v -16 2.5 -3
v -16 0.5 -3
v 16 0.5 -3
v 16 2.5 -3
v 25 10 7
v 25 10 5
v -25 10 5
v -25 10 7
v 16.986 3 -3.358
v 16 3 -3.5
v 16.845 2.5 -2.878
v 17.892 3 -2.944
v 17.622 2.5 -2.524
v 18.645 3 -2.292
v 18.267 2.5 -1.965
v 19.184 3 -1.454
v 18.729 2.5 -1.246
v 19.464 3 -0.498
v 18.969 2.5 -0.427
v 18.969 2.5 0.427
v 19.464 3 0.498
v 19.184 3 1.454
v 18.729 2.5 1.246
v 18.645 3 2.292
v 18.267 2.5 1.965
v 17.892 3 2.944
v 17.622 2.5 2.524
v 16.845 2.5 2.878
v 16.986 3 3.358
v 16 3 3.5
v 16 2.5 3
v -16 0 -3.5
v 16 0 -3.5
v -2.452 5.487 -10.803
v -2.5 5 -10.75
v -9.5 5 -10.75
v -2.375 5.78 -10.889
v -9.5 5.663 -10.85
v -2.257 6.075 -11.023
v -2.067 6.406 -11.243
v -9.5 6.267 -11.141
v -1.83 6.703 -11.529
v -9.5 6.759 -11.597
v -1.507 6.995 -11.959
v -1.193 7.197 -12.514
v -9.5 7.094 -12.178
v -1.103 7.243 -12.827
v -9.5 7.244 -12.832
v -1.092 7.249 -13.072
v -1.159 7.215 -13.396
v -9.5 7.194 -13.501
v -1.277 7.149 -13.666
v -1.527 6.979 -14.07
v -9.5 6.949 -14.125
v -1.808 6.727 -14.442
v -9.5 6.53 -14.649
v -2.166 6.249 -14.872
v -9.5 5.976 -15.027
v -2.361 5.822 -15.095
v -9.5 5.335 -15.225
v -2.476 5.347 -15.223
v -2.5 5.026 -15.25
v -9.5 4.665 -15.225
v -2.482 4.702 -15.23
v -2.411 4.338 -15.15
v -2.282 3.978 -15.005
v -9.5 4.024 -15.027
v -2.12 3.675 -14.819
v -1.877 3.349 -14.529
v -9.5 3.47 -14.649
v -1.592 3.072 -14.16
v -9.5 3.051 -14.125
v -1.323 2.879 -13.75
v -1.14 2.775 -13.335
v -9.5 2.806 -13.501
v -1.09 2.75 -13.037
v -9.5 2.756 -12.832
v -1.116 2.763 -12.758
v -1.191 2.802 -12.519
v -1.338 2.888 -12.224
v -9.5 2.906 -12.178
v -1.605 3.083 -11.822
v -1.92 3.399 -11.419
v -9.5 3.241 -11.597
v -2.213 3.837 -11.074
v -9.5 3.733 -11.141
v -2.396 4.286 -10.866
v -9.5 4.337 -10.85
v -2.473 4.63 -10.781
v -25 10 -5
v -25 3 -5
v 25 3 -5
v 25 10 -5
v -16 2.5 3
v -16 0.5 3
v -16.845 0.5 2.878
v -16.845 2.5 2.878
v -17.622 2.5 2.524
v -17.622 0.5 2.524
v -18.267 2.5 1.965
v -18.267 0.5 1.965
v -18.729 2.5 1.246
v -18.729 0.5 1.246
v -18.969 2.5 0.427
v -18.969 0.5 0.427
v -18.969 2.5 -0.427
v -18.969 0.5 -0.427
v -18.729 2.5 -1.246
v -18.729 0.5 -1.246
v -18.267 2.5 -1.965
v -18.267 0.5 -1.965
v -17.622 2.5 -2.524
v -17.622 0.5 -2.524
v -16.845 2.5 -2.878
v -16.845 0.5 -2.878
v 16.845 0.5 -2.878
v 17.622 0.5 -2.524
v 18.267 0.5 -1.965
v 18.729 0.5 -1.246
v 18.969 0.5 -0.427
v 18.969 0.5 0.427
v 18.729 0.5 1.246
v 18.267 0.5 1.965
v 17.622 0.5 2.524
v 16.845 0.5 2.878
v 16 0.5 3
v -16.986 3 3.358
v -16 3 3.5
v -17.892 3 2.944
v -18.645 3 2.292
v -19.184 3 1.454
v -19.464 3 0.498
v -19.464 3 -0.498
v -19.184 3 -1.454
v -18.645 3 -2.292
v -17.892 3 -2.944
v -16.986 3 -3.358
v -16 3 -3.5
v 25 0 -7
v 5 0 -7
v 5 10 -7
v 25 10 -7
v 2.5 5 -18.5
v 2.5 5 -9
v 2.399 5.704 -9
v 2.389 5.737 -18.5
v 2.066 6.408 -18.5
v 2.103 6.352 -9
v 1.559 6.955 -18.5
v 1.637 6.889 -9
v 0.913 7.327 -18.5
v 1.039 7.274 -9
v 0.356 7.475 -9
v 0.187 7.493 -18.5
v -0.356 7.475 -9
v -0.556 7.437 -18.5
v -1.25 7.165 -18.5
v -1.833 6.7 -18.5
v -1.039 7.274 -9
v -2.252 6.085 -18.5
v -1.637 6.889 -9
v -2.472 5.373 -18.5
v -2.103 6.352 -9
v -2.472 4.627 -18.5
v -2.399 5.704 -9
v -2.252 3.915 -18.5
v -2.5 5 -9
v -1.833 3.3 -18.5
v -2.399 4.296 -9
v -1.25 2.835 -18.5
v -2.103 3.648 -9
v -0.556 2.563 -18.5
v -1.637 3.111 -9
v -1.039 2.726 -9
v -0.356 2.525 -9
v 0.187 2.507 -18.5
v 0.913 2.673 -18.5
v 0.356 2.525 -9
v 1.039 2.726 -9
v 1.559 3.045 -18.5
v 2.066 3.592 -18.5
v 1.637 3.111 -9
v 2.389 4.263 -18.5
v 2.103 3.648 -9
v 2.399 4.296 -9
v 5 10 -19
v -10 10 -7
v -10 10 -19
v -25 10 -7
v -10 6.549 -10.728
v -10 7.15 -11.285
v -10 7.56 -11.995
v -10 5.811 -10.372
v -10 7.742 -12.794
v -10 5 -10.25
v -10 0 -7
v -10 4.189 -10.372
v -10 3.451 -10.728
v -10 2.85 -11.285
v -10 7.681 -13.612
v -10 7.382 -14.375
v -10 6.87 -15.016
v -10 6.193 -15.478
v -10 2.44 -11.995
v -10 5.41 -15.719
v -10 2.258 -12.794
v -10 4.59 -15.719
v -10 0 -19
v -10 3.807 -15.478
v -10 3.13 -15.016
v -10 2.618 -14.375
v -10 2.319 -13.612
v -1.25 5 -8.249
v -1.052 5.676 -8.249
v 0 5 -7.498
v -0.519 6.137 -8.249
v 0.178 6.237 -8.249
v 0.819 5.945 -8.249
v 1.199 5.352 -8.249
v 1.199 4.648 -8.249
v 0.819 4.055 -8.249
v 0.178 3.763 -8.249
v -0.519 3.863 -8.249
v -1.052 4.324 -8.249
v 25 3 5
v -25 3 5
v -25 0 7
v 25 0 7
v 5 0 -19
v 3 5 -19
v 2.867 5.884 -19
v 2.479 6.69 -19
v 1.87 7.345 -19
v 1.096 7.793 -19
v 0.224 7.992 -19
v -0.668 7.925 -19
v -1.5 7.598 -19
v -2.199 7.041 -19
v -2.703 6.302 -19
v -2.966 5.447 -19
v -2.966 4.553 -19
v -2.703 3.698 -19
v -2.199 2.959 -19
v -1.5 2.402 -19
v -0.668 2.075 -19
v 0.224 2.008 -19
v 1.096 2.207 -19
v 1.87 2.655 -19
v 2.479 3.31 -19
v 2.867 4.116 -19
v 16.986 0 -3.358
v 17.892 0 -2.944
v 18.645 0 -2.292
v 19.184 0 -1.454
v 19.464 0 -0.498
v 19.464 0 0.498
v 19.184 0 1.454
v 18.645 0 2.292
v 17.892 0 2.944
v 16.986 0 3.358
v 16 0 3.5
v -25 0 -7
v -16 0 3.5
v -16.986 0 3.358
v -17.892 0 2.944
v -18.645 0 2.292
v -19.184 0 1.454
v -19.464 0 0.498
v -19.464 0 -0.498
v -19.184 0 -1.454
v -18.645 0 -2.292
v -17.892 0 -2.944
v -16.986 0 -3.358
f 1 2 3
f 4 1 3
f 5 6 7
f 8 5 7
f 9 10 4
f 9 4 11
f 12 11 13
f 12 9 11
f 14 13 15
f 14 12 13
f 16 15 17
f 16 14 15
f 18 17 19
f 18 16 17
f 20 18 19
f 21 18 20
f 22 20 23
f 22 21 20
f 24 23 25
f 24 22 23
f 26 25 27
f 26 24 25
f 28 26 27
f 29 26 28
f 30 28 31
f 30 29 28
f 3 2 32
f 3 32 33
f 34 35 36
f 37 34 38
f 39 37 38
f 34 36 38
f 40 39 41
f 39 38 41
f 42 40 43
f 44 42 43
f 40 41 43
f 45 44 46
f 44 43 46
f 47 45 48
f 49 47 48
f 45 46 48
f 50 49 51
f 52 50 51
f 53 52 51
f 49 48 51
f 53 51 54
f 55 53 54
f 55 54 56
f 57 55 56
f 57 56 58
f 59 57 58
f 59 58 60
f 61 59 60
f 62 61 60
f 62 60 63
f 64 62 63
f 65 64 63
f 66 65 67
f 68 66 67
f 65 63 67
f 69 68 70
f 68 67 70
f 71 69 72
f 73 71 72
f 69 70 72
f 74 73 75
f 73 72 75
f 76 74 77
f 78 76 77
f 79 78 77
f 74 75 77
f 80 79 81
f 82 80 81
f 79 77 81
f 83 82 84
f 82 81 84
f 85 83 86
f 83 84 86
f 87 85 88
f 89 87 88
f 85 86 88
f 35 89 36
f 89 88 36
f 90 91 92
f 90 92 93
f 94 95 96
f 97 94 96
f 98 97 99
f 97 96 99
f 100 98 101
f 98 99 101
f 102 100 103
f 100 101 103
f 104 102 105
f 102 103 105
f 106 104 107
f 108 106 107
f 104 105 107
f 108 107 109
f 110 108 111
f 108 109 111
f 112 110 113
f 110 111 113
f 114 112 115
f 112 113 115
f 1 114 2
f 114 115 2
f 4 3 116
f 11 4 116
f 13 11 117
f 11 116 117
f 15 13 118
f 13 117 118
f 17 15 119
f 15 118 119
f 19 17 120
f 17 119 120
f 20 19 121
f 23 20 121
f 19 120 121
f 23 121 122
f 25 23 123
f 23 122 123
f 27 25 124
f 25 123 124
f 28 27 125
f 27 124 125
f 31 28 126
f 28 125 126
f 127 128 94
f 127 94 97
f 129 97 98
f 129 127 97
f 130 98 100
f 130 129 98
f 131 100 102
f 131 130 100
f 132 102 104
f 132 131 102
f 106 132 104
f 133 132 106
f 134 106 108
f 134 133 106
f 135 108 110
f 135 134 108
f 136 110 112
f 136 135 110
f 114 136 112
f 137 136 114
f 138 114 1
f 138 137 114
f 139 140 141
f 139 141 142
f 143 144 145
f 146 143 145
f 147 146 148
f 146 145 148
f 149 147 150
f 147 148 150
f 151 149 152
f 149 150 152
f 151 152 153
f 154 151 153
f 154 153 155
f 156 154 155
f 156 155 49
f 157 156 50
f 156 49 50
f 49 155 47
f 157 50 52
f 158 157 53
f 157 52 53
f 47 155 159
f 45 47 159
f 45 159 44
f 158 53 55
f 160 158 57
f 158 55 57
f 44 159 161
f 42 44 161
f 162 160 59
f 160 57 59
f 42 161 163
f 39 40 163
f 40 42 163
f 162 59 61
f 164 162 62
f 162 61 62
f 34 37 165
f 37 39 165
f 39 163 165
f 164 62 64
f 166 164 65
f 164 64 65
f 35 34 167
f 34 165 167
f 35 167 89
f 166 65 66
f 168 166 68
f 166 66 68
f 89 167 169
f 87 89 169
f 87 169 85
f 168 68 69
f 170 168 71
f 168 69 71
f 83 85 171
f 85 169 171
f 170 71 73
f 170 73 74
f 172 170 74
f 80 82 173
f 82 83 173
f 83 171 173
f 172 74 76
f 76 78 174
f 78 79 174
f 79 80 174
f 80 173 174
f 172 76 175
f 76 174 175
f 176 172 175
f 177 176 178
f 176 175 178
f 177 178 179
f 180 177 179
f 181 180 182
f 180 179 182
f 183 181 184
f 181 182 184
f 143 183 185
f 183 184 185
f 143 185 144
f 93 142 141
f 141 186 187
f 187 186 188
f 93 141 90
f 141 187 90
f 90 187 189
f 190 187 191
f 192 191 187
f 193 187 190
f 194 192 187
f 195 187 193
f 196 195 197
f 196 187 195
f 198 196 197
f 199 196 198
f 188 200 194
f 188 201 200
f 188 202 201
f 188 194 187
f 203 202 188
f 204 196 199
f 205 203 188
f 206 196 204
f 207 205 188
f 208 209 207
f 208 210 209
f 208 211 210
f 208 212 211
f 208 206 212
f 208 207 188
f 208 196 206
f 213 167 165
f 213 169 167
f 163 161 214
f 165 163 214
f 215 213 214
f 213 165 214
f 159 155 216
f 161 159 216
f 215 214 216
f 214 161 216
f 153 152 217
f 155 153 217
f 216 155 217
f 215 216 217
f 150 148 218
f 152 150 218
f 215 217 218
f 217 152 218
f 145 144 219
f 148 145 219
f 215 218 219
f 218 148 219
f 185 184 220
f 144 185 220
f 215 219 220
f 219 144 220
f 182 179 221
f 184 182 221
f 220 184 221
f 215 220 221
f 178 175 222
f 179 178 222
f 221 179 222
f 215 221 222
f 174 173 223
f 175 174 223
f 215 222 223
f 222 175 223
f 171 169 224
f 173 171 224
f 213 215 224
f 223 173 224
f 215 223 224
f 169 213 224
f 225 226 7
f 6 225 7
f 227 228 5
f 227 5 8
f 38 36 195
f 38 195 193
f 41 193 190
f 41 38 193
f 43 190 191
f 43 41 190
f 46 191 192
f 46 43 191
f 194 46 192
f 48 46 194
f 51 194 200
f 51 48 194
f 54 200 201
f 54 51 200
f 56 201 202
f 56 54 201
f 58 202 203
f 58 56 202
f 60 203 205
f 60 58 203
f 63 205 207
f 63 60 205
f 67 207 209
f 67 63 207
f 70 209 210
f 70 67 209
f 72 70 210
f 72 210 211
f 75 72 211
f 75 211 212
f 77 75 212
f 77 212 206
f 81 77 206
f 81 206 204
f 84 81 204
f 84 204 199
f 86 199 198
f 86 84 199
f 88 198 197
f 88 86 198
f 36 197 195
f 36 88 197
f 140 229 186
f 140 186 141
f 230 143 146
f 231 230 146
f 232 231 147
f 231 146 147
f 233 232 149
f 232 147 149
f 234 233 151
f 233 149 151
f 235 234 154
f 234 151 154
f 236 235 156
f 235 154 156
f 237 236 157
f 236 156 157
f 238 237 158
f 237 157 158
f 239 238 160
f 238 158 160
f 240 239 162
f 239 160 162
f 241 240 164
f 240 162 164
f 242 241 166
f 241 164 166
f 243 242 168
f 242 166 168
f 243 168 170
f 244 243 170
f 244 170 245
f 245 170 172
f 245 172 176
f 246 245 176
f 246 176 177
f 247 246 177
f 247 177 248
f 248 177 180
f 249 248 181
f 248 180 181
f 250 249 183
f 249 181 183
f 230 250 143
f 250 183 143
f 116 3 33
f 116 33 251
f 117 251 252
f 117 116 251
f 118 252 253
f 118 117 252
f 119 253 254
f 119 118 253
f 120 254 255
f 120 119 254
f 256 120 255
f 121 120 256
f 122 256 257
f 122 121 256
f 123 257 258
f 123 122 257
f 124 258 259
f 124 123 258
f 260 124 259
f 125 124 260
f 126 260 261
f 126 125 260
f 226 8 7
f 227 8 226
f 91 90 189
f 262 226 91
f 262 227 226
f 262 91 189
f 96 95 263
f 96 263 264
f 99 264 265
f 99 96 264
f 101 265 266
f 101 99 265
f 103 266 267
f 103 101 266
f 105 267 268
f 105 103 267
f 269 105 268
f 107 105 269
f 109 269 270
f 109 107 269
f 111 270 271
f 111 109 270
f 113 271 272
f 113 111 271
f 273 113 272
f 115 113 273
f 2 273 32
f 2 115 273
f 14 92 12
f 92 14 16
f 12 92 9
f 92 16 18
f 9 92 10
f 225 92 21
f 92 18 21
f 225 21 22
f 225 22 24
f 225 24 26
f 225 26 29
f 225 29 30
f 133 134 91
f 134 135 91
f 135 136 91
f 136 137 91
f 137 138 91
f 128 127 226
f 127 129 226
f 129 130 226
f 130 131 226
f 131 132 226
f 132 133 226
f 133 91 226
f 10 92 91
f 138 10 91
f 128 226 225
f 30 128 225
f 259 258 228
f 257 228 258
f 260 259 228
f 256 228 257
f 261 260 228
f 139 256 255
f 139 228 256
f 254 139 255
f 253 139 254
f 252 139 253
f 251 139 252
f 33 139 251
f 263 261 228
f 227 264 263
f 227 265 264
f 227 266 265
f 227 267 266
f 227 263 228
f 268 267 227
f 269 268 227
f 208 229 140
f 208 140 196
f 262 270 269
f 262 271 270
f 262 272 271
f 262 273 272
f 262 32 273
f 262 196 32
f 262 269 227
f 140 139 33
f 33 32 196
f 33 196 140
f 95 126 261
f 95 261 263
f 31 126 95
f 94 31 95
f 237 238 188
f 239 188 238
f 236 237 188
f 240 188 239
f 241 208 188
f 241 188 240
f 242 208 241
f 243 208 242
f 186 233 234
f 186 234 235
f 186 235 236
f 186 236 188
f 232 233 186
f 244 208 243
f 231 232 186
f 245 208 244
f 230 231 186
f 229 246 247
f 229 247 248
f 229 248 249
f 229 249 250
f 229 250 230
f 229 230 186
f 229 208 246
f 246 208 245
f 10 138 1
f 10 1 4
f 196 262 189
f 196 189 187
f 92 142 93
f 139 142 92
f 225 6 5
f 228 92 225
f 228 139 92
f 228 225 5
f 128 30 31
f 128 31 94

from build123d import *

# Parameters (mm, degrees)
BOSS_EXTRUDE1_DEPTH              = 10
SKETCH2_W                        = 10
SKETCH2_H                        = 7
CUT_EXTRUDE2_DEPTH               = 71
CUT_EXTRUDE3_DEPTH               = 71
F_5_0_19685_DIAMETER_HOLE1_D     = 4.99999
F_5_0_19685_DIAMETER_HOLE1_DEPTH = 10
F_5_0_19685_DIAMETER_HOLE1_TIP   = 1.502148543
CUT_EXTRUDE4_REACH               = 43.061
CUT_EXTRUDE4_END_RADIUS          = 2.499995
SKETCH8_R                        = 2.25
CHAMFER1_SIZE                    = 0.5


with BuildPart() as part:
    # Sketch1 → Boss-Extrude1 (new body)
    with BuildSketch(Plane(origin=(0, 0, 0), x_dir=(1, 0, 0), z_dir=(0, 1, 0))):
        Polygon((-10, 7), (-10, 19), (5, 19), (5, 7), (25, 7), (25, -7), (-25, -7), (-25, 7), align=None)
    extrude(amount=BOSS_EXTRUDE1_DEPTH)

    # Sketch2 → Cut-Extrude2 (cut)
    with BuildSketch(Plane.ZY.offset(25)):
        with Locations((0, 6.5)):
            Rectangle(SKETCH2_W, SKETCH2_H)
    extrude(amount=-CUT_EXTRUDE2_DEPTH, mode=Mode.SUBTRACT)

    # Sketch4 → Cut-Extrude3 (cut)
    with BuildSketch(Plane(origin=(0, 0, 0), x_dir=(1, 0, 0), z_dir=(0, 1, 0))):
        with BuildLine():
            Line((-16, 3), (16, 3))
            ThreePointArc((16, 3), (19, 0), (16, -3))
            Line((16, -3), (-16, -3))
            ThreePointArc((-16, -3), (-19, 0), (-16, 3))
        make_face()
    extrude(amount=CUT_EXTRUDE3_DEPTH, mode=Mode.SUBTRACT)

    # #5 (0.19685) Diameter Hole1
    with Locations(Plane(origin=(0, 0, -19), x_dir=(-1, 0, 0), z_dir=(0, 0, -1))):
        with Locations((0, 5)):
            Hole(F_5_0_19685_DIAMETER_HOLE1_D / 2, depth=F_5_0_19685_DIAMETER_HOLE1_DEPTH)
            with Locations((0, 0, -(F_5_0_19685_DIAMETER_HOLE1_DEPTH + F_5_0_19685_DIAMETER_HOLE1_TIP / 2))):  # 118° drill point
                Cone(0, F_5_0_19685_DIAMETER_HOLE1_D / 2, F_5_0_19685_DIAMETER_HOLE1_TIP, mode=Mode.SUBTRACT)

    # Cut-Extrude4: up to this cylinder (the profile starts outside it)
    cut_extrude4_end = Plane(origin=(0, 5, -13), z_dir=(0, 0, -1)) * Cylinder(CUT_EXTRUDE4_END_RADIUS, 92.12199, mode=Mode.PRIVATE)
    # Sketch8 → Cut-Extrude4 (cut, up to the surface)
    with BuildSketch(Plane.ZY.offset(10), mode=Mode.PRIVATE) as cut_extrude4_sk1:
        with Locations((-13, 5)):
            Circle(SKETCH8_R)
    cut_extrude4_tool1 = extrude(cut_extrude4_sk1.sketch, amount=-CUT_EXTRUDE4_REACH, mode=Mode.PRIVATE) - cut_extrude4_end
    add(cut_extrude4_tool1.solids().sort_by_distance((-10, 5, -13))[0], mode=Mode.SUBTRACT)

    # Chamfer1
    chamfer1_edges = [part.edges().sort_by_distance(p)[0] for p in [
        (0, 3, -3),
        (19, 3, 0),
        (0, 3, 3),
        (-19, 3, 0),
        (-19, 0, 0),
        (0, 0, 3),
        (19, 0, 0),
        (0, 0, -3),
        (-2.499995, 5, -19),
        (-10, 5, -15.25),
    ]]
    chamfer(chamfer1_edges, length=CHAMFER1_SIZE)


solid = part.part
